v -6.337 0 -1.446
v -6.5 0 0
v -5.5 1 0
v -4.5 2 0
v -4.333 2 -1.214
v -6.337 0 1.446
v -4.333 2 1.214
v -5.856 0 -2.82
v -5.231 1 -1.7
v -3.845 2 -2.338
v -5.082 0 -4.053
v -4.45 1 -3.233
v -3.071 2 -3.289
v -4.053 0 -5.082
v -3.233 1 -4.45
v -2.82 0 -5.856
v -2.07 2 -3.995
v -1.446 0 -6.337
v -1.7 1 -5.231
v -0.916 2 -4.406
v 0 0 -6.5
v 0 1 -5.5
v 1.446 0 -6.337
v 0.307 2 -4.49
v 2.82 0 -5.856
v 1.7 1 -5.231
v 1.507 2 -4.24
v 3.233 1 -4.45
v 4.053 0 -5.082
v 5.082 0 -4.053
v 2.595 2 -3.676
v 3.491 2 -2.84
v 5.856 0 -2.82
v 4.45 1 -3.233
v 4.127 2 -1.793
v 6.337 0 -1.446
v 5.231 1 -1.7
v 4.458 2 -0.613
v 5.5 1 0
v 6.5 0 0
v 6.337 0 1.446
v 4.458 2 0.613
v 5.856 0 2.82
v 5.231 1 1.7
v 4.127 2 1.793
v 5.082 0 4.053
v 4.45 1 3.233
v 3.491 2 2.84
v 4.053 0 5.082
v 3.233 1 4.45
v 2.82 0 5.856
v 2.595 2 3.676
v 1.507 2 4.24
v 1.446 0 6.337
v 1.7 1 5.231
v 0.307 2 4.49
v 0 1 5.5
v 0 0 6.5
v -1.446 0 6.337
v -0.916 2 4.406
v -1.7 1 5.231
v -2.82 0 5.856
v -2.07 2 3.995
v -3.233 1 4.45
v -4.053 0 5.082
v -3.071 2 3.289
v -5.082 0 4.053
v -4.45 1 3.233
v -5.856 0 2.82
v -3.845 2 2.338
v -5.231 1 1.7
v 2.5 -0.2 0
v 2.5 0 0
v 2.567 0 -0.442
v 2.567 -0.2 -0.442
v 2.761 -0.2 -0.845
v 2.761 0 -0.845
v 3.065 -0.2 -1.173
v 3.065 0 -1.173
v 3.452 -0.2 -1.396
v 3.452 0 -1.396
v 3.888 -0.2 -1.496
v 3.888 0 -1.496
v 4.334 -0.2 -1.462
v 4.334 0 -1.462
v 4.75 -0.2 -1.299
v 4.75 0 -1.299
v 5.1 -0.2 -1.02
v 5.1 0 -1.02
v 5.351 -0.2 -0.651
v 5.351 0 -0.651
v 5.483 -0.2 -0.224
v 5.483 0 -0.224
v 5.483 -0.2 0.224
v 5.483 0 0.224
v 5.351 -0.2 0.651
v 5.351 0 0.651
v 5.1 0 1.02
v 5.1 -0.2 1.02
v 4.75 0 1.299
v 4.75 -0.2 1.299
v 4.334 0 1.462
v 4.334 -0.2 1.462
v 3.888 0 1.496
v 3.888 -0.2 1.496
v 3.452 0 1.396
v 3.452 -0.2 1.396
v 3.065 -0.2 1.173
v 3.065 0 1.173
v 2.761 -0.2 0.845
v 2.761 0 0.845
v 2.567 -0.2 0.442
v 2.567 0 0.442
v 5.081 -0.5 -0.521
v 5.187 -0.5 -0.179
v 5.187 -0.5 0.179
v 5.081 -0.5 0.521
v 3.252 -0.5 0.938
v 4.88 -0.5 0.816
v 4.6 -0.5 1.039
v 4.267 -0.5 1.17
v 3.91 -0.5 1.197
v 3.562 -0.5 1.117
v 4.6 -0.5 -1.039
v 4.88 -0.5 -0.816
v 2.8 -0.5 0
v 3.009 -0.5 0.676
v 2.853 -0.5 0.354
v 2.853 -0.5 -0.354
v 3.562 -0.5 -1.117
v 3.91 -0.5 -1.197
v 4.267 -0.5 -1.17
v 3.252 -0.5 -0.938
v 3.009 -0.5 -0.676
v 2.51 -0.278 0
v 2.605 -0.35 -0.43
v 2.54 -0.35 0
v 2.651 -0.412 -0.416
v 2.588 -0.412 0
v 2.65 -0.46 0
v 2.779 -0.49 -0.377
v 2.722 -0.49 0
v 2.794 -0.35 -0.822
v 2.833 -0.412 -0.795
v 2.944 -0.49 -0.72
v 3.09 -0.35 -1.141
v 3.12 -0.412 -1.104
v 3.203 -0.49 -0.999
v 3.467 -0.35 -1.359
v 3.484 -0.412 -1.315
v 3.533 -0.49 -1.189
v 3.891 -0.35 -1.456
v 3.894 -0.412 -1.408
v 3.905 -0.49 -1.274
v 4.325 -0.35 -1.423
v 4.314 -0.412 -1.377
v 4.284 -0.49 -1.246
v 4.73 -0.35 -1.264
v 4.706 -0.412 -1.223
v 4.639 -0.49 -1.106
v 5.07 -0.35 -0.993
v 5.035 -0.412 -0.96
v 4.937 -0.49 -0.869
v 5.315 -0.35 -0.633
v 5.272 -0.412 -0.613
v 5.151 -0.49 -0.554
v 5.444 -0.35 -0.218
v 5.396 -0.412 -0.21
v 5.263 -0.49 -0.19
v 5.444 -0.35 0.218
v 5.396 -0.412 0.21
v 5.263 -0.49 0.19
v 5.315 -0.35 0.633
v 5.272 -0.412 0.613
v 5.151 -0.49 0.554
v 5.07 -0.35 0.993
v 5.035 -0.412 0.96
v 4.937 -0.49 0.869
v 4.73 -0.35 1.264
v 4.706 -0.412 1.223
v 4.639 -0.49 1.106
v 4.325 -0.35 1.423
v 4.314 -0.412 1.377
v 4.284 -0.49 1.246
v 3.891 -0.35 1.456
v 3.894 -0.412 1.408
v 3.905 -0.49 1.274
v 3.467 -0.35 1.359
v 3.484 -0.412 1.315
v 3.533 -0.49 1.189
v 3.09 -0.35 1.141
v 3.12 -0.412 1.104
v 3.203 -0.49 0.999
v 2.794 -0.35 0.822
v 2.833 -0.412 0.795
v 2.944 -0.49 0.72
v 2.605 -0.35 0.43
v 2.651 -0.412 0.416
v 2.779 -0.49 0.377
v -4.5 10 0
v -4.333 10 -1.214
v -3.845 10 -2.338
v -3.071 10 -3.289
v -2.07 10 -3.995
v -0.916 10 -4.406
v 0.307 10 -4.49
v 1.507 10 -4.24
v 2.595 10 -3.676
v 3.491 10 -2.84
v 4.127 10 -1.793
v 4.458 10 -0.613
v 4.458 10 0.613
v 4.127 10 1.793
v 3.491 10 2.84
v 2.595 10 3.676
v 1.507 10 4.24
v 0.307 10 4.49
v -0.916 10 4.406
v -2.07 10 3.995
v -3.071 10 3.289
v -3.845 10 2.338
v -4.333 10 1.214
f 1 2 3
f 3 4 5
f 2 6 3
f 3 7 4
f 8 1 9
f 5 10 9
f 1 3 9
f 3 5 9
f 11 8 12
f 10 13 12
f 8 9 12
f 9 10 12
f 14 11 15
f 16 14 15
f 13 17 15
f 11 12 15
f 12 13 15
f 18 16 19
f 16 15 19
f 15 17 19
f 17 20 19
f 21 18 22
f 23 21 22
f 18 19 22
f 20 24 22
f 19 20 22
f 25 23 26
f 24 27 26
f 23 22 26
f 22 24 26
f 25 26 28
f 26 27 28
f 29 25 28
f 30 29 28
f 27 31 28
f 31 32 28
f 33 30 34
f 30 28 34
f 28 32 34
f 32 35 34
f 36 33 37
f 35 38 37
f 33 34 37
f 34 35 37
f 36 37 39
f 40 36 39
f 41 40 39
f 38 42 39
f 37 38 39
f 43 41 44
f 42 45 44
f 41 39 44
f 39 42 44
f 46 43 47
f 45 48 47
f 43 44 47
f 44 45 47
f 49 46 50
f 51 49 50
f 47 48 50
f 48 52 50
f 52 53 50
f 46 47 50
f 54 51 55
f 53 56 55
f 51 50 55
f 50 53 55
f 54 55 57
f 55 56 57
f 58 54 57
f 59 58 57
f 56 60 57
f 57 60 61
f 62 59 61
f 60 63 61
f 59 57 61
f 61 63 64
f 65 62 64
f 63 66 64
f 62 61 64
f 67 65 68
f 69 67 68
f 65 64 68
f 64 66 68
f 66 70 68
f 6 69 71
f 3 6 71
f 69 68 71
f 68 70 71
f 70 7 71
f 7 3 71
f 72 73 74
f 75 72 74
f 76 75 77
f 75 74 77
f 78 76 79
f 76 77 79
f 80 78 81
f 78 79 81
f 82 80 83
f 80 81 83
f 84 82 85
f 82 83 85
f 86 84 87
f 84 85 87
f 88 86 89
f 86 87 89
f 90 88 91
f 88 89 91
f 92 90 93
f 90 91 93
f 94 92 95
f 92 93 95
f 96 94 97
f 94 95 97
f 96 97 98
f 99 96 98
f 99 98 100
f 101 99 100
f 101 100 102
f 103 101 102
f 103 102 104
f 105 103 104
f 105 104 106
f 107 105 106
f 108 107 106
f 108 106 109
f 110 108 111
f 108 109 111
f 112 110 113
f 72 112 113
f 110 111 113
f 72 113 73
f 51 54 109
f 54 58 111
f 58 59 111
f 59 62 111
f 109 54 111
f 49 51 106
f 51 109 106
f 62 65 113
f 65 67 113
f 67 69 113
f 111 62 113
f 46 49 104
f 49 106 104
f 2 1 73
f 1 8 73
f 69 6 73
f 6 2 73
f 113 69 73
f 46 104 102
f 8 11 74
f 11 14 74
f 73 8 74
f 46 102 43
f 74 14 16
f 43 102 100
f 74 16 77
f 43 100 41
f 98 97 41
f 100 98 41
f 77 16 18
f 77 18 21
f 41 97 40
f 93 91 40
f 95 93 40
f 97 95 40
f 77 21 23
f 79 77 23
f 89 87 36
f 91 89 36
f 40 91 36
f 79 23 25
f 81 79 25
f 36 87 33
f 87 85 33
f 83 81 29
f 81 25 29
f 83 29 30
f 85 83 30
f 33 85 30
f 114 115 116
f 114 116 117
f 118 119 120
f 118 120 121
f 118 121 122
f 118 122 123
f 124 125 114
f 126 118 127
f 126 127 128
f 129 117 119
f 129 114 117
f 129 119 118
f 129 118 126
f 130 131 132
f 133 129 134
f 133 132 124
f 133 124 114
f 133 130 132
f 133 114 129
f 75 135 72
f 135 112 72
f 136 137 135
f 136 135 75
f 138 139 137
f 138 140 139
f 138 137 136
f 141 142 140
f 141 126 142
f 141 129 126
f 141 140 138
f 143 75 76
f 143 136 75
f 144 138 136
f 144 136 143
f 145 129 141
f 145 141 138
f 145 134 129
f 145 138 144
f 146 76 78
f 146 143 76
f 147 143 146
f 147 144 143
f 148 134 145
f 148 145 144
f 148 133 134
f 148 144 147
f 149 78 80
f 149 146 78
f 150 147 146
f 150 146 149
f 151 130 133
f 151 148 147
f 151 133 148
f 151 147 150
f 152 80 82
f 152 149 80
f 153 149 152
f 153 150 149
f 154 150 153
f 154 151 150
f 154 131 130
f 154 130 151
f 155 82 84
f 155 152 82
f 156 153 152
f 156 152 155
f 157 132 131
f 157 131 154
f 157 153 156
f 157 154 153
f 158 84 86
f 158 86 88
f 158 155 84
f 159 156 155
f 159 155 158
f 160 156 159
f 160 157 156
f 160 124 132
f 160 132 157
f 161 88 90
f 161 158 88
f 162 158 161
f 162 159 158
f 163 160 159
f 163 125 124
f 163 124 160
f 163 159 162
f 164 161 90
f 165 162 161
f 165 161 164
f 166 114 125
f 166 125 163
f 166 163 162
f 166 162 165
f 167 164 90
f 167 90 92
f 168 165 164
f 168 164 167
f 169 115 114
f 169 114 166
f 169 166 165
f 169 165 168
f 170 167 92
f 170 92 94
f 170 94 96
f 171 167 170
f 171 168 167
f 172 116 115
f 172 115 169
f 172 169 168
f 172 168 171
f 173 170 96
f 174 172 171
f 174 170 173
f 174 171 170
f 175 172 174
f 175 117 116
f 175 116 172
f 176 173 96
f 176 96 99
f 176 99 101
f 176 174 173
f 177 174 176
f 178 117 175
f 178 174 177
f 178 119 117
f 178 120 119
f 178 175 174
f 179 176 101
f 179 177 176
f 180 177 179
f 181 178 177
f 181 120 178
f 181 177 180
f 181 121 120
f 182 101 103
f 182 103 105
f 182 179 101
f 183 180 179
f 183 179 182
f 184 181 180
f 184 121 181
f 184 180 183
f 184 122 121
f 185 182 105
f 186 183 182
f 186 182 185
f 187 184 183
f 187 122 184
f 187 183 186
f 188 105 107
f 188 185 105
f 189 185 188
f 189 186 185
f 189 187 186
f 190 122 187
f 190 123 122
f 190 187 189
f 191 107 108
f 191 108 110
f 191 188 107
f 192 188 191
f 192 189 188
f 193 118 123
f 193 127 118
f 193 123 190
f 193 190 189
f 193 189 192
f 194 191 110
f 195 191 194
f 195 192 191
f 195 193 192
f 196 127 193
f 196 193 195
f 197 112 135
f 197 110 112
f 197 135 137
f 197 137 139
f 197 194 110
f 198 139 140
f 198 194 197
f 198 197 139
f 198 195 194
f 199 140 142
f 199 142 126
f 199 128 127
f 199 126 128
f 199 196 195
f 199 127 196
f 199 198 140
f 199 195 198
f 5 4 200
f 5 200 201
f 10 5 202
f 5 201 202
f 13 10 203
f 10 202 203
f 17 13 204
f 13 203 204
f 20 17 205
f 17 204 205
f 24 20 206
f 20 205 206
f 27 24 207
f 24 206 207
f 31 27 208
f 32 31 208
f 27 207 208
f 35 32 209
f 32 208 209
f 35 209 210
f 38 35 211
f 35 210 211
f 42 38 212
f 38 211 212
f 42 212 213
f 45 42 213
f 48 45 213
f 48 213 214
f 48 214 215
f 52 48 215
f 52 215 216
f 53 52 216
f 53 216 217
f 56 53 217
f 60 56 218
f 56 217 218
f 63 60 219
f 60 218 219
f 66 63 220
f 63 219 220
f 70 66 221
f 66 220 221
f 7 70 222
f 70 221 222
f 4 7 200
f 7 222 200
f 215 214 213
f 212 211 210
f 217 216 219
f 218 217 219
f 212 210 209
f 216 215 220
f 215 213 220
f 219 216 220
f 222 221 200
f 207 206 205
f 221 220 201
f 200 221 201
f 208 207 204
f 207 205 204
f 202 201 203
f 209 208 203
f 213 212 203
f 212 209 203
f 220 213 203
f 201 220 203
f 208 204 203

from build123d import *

# Parameters (mm, degrees)
SKETCH2_R           = 1.5
BOSS_EXTRUDE1_DEPTH = 0.5
FILLET1_R           = 0.3


with BuildPart() as part:
    # Sketch1 → Revolve1 (revolve)
    with BuildSketch(Plane.XY, mode=Mode.PRIVATE) as revolve1_sk:
        Polygon((0, 0), (6.5, 0), (4.5, 2), (4.5, 10), (0, 10), align=None)
    revolve(revolve1_sk.sketch.rotate(Axis((0, 10, 0), (0, -1, 0)), 180), axis=Axis((0, 10, 0), (0, -1, 0)))  # turned: the seam where the file's is

    # Sketch2 → Boss-Extrude1 (add)
    with BuildSketch(Plane.XZ):
        with Locations(Location((4, 0, 0), (0, 0, 180))):  # turned: the seam where the file's is
            Circle(SKETCH2_R)
    extrude(amount=BOSS_EXTRUDE1_DEPTH)

    # Fillet1
    fillet1_edges = [part.edges().sort_by_distance(p)[0] for p in [
        (5.5, -0.5, 0),
    ]]
    fillet(fillet1_edges, radius=FILLET1_R)


solid = part.part
